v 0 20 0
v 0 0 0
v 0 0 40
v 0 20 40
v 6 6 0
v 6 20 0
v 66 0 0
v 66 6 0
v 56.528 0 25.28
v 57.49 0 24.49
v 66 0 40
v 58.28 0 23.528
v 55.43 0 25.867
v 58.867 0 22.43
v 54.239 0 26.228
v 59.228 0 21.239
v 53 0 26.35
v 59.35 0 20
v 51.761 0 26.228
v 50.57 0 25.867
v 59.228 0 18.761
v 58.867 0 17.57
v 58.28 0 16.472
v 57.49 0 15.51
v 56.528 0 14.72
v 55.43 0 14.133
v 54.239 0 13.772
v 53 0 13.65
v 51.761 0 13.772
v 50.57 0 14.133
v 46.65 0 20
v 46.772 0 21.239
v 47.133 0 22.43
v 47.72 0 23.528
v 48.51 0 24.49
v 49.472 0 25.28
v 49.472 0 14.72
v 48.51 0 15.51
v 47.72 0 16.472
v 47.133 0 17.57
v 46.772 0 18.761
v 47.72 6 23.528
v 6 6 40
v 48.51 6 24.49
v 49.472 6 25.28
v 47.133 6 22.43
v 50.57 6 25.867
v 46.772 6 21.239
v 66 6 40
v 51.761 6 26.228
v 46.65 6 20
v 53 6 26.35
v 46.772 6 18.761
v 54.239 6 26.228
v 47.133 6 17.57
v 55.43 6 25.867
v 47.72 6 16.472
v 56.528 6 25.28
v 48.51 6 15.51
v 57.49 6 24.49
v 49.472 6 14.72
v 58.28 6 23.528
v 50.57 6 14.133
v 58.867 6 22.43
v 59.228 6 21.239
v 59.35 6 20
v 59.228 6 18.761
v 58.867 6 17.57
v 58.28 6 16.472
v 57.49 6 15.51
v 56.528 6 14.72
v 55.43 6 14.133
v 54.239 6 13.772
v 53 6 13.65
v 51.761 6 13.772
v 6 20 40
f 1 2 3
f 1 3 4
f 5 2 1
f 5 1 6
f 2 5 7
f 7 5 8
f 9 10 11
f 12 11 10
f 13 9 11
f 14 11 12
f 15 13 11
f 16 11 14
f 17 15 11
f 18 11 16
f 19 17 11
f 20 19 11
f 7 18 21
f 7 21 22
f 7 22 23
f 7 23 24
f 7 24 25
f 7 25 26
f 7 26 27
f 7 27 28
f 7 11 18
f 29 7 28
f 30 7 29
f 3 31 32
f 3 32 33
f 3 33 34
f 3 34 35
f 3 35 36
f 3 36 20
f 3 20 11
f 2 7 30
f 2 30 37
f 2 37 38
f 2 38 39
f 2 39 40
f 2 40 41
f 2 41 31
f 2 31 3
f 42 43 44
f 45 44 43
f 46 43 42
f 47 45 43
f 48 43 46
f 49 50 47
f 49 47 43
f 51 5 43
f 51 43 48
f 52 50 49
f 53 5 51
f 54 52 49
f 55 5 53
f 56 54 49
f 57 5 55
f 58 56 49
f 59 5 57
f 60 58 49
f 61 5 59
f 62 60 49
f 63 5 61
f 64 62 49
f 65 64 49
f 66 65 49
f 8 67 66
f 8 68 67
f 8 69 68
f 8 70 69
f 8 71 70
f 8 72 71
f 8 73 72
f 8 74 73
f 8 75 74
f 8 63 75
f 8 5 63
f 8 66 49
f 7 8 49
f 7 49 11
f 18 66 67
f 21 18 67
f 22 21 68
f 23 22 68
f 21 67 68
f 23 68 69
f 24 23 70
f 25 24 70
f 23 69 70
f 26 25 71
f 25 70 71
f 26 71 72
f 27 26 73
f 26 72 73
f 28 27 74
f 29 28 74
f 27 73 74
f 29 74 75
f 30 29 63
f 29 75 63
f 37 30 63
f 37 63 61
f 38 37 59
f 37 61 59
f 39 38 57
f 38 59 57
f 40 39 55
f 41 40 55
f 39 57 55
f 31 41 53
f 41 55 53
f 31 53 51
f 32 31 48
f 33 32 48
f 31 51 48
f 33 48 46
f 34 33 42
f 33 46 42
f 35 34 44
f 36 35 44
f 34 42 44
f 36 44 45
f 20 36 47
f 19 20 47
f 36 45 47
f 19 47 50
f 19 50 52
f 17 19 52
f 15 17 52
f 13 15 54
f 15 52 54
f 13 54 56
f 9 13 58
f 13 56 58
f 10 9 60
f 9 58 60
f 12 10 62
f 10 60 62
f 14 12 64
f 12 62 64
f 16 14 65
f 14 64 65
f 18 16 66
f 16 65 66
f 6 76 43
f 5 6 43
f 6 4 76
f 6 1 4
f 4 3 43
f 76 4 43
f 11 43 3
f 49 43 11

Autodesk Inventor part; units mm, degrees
ref_plane "YZ Plane" through (0, 0, 0) normal (1, 0, 0) x (0, 1, 0)
ref_plane "XZ Plane" through (0, 0, 0) normal (0, 1, 0) x (-1, 0, 0)
ref_plane "XY Plane" through (0, 0, 0) normal (0, 0, 1) x (1, 0, 0)
sketch "Sketch1" plane through (0, 0, 0) normal (0, 0, 1) x (1, 0, 0)
  line L0 (0, 0) -> (0, 20)
  line L1 (0, 20) -> (6, 20)
  line L2 (6, 20) -> (6, 6)
  line L3 (6, 6) -> (66, 6)
  line L4 (66, 6) -> (66, 0)
  line L5 (66, 0) -> (0, 0)
  dimension "d0" = 20
  dimension "d1" = 6
  dimension "d2" = 14
  dimension "d3" = 60
  dimension "d4" = 6
extrude "Extrusion1" add sketch "Sketch1" along normal blind 40
sketch "Sketch2" plane through (6, 6, 0) normal (0, 1, 0) x (1, 0, 0)
  line L0 (0, 0) -> (0, -40) projected
  circle A0 centre (47, -20) radius 6.35
  line L1 (60, 0) -> (0, 0) projected
  line L2 (60, -40) -> (0, -40) projected
  point P0 (-6, 0)
  dimension "d8" = 12.7
extrude "Extrusion2" cut sketch "Sketch2" against normal blind 40
properties part number "motor_angle"
